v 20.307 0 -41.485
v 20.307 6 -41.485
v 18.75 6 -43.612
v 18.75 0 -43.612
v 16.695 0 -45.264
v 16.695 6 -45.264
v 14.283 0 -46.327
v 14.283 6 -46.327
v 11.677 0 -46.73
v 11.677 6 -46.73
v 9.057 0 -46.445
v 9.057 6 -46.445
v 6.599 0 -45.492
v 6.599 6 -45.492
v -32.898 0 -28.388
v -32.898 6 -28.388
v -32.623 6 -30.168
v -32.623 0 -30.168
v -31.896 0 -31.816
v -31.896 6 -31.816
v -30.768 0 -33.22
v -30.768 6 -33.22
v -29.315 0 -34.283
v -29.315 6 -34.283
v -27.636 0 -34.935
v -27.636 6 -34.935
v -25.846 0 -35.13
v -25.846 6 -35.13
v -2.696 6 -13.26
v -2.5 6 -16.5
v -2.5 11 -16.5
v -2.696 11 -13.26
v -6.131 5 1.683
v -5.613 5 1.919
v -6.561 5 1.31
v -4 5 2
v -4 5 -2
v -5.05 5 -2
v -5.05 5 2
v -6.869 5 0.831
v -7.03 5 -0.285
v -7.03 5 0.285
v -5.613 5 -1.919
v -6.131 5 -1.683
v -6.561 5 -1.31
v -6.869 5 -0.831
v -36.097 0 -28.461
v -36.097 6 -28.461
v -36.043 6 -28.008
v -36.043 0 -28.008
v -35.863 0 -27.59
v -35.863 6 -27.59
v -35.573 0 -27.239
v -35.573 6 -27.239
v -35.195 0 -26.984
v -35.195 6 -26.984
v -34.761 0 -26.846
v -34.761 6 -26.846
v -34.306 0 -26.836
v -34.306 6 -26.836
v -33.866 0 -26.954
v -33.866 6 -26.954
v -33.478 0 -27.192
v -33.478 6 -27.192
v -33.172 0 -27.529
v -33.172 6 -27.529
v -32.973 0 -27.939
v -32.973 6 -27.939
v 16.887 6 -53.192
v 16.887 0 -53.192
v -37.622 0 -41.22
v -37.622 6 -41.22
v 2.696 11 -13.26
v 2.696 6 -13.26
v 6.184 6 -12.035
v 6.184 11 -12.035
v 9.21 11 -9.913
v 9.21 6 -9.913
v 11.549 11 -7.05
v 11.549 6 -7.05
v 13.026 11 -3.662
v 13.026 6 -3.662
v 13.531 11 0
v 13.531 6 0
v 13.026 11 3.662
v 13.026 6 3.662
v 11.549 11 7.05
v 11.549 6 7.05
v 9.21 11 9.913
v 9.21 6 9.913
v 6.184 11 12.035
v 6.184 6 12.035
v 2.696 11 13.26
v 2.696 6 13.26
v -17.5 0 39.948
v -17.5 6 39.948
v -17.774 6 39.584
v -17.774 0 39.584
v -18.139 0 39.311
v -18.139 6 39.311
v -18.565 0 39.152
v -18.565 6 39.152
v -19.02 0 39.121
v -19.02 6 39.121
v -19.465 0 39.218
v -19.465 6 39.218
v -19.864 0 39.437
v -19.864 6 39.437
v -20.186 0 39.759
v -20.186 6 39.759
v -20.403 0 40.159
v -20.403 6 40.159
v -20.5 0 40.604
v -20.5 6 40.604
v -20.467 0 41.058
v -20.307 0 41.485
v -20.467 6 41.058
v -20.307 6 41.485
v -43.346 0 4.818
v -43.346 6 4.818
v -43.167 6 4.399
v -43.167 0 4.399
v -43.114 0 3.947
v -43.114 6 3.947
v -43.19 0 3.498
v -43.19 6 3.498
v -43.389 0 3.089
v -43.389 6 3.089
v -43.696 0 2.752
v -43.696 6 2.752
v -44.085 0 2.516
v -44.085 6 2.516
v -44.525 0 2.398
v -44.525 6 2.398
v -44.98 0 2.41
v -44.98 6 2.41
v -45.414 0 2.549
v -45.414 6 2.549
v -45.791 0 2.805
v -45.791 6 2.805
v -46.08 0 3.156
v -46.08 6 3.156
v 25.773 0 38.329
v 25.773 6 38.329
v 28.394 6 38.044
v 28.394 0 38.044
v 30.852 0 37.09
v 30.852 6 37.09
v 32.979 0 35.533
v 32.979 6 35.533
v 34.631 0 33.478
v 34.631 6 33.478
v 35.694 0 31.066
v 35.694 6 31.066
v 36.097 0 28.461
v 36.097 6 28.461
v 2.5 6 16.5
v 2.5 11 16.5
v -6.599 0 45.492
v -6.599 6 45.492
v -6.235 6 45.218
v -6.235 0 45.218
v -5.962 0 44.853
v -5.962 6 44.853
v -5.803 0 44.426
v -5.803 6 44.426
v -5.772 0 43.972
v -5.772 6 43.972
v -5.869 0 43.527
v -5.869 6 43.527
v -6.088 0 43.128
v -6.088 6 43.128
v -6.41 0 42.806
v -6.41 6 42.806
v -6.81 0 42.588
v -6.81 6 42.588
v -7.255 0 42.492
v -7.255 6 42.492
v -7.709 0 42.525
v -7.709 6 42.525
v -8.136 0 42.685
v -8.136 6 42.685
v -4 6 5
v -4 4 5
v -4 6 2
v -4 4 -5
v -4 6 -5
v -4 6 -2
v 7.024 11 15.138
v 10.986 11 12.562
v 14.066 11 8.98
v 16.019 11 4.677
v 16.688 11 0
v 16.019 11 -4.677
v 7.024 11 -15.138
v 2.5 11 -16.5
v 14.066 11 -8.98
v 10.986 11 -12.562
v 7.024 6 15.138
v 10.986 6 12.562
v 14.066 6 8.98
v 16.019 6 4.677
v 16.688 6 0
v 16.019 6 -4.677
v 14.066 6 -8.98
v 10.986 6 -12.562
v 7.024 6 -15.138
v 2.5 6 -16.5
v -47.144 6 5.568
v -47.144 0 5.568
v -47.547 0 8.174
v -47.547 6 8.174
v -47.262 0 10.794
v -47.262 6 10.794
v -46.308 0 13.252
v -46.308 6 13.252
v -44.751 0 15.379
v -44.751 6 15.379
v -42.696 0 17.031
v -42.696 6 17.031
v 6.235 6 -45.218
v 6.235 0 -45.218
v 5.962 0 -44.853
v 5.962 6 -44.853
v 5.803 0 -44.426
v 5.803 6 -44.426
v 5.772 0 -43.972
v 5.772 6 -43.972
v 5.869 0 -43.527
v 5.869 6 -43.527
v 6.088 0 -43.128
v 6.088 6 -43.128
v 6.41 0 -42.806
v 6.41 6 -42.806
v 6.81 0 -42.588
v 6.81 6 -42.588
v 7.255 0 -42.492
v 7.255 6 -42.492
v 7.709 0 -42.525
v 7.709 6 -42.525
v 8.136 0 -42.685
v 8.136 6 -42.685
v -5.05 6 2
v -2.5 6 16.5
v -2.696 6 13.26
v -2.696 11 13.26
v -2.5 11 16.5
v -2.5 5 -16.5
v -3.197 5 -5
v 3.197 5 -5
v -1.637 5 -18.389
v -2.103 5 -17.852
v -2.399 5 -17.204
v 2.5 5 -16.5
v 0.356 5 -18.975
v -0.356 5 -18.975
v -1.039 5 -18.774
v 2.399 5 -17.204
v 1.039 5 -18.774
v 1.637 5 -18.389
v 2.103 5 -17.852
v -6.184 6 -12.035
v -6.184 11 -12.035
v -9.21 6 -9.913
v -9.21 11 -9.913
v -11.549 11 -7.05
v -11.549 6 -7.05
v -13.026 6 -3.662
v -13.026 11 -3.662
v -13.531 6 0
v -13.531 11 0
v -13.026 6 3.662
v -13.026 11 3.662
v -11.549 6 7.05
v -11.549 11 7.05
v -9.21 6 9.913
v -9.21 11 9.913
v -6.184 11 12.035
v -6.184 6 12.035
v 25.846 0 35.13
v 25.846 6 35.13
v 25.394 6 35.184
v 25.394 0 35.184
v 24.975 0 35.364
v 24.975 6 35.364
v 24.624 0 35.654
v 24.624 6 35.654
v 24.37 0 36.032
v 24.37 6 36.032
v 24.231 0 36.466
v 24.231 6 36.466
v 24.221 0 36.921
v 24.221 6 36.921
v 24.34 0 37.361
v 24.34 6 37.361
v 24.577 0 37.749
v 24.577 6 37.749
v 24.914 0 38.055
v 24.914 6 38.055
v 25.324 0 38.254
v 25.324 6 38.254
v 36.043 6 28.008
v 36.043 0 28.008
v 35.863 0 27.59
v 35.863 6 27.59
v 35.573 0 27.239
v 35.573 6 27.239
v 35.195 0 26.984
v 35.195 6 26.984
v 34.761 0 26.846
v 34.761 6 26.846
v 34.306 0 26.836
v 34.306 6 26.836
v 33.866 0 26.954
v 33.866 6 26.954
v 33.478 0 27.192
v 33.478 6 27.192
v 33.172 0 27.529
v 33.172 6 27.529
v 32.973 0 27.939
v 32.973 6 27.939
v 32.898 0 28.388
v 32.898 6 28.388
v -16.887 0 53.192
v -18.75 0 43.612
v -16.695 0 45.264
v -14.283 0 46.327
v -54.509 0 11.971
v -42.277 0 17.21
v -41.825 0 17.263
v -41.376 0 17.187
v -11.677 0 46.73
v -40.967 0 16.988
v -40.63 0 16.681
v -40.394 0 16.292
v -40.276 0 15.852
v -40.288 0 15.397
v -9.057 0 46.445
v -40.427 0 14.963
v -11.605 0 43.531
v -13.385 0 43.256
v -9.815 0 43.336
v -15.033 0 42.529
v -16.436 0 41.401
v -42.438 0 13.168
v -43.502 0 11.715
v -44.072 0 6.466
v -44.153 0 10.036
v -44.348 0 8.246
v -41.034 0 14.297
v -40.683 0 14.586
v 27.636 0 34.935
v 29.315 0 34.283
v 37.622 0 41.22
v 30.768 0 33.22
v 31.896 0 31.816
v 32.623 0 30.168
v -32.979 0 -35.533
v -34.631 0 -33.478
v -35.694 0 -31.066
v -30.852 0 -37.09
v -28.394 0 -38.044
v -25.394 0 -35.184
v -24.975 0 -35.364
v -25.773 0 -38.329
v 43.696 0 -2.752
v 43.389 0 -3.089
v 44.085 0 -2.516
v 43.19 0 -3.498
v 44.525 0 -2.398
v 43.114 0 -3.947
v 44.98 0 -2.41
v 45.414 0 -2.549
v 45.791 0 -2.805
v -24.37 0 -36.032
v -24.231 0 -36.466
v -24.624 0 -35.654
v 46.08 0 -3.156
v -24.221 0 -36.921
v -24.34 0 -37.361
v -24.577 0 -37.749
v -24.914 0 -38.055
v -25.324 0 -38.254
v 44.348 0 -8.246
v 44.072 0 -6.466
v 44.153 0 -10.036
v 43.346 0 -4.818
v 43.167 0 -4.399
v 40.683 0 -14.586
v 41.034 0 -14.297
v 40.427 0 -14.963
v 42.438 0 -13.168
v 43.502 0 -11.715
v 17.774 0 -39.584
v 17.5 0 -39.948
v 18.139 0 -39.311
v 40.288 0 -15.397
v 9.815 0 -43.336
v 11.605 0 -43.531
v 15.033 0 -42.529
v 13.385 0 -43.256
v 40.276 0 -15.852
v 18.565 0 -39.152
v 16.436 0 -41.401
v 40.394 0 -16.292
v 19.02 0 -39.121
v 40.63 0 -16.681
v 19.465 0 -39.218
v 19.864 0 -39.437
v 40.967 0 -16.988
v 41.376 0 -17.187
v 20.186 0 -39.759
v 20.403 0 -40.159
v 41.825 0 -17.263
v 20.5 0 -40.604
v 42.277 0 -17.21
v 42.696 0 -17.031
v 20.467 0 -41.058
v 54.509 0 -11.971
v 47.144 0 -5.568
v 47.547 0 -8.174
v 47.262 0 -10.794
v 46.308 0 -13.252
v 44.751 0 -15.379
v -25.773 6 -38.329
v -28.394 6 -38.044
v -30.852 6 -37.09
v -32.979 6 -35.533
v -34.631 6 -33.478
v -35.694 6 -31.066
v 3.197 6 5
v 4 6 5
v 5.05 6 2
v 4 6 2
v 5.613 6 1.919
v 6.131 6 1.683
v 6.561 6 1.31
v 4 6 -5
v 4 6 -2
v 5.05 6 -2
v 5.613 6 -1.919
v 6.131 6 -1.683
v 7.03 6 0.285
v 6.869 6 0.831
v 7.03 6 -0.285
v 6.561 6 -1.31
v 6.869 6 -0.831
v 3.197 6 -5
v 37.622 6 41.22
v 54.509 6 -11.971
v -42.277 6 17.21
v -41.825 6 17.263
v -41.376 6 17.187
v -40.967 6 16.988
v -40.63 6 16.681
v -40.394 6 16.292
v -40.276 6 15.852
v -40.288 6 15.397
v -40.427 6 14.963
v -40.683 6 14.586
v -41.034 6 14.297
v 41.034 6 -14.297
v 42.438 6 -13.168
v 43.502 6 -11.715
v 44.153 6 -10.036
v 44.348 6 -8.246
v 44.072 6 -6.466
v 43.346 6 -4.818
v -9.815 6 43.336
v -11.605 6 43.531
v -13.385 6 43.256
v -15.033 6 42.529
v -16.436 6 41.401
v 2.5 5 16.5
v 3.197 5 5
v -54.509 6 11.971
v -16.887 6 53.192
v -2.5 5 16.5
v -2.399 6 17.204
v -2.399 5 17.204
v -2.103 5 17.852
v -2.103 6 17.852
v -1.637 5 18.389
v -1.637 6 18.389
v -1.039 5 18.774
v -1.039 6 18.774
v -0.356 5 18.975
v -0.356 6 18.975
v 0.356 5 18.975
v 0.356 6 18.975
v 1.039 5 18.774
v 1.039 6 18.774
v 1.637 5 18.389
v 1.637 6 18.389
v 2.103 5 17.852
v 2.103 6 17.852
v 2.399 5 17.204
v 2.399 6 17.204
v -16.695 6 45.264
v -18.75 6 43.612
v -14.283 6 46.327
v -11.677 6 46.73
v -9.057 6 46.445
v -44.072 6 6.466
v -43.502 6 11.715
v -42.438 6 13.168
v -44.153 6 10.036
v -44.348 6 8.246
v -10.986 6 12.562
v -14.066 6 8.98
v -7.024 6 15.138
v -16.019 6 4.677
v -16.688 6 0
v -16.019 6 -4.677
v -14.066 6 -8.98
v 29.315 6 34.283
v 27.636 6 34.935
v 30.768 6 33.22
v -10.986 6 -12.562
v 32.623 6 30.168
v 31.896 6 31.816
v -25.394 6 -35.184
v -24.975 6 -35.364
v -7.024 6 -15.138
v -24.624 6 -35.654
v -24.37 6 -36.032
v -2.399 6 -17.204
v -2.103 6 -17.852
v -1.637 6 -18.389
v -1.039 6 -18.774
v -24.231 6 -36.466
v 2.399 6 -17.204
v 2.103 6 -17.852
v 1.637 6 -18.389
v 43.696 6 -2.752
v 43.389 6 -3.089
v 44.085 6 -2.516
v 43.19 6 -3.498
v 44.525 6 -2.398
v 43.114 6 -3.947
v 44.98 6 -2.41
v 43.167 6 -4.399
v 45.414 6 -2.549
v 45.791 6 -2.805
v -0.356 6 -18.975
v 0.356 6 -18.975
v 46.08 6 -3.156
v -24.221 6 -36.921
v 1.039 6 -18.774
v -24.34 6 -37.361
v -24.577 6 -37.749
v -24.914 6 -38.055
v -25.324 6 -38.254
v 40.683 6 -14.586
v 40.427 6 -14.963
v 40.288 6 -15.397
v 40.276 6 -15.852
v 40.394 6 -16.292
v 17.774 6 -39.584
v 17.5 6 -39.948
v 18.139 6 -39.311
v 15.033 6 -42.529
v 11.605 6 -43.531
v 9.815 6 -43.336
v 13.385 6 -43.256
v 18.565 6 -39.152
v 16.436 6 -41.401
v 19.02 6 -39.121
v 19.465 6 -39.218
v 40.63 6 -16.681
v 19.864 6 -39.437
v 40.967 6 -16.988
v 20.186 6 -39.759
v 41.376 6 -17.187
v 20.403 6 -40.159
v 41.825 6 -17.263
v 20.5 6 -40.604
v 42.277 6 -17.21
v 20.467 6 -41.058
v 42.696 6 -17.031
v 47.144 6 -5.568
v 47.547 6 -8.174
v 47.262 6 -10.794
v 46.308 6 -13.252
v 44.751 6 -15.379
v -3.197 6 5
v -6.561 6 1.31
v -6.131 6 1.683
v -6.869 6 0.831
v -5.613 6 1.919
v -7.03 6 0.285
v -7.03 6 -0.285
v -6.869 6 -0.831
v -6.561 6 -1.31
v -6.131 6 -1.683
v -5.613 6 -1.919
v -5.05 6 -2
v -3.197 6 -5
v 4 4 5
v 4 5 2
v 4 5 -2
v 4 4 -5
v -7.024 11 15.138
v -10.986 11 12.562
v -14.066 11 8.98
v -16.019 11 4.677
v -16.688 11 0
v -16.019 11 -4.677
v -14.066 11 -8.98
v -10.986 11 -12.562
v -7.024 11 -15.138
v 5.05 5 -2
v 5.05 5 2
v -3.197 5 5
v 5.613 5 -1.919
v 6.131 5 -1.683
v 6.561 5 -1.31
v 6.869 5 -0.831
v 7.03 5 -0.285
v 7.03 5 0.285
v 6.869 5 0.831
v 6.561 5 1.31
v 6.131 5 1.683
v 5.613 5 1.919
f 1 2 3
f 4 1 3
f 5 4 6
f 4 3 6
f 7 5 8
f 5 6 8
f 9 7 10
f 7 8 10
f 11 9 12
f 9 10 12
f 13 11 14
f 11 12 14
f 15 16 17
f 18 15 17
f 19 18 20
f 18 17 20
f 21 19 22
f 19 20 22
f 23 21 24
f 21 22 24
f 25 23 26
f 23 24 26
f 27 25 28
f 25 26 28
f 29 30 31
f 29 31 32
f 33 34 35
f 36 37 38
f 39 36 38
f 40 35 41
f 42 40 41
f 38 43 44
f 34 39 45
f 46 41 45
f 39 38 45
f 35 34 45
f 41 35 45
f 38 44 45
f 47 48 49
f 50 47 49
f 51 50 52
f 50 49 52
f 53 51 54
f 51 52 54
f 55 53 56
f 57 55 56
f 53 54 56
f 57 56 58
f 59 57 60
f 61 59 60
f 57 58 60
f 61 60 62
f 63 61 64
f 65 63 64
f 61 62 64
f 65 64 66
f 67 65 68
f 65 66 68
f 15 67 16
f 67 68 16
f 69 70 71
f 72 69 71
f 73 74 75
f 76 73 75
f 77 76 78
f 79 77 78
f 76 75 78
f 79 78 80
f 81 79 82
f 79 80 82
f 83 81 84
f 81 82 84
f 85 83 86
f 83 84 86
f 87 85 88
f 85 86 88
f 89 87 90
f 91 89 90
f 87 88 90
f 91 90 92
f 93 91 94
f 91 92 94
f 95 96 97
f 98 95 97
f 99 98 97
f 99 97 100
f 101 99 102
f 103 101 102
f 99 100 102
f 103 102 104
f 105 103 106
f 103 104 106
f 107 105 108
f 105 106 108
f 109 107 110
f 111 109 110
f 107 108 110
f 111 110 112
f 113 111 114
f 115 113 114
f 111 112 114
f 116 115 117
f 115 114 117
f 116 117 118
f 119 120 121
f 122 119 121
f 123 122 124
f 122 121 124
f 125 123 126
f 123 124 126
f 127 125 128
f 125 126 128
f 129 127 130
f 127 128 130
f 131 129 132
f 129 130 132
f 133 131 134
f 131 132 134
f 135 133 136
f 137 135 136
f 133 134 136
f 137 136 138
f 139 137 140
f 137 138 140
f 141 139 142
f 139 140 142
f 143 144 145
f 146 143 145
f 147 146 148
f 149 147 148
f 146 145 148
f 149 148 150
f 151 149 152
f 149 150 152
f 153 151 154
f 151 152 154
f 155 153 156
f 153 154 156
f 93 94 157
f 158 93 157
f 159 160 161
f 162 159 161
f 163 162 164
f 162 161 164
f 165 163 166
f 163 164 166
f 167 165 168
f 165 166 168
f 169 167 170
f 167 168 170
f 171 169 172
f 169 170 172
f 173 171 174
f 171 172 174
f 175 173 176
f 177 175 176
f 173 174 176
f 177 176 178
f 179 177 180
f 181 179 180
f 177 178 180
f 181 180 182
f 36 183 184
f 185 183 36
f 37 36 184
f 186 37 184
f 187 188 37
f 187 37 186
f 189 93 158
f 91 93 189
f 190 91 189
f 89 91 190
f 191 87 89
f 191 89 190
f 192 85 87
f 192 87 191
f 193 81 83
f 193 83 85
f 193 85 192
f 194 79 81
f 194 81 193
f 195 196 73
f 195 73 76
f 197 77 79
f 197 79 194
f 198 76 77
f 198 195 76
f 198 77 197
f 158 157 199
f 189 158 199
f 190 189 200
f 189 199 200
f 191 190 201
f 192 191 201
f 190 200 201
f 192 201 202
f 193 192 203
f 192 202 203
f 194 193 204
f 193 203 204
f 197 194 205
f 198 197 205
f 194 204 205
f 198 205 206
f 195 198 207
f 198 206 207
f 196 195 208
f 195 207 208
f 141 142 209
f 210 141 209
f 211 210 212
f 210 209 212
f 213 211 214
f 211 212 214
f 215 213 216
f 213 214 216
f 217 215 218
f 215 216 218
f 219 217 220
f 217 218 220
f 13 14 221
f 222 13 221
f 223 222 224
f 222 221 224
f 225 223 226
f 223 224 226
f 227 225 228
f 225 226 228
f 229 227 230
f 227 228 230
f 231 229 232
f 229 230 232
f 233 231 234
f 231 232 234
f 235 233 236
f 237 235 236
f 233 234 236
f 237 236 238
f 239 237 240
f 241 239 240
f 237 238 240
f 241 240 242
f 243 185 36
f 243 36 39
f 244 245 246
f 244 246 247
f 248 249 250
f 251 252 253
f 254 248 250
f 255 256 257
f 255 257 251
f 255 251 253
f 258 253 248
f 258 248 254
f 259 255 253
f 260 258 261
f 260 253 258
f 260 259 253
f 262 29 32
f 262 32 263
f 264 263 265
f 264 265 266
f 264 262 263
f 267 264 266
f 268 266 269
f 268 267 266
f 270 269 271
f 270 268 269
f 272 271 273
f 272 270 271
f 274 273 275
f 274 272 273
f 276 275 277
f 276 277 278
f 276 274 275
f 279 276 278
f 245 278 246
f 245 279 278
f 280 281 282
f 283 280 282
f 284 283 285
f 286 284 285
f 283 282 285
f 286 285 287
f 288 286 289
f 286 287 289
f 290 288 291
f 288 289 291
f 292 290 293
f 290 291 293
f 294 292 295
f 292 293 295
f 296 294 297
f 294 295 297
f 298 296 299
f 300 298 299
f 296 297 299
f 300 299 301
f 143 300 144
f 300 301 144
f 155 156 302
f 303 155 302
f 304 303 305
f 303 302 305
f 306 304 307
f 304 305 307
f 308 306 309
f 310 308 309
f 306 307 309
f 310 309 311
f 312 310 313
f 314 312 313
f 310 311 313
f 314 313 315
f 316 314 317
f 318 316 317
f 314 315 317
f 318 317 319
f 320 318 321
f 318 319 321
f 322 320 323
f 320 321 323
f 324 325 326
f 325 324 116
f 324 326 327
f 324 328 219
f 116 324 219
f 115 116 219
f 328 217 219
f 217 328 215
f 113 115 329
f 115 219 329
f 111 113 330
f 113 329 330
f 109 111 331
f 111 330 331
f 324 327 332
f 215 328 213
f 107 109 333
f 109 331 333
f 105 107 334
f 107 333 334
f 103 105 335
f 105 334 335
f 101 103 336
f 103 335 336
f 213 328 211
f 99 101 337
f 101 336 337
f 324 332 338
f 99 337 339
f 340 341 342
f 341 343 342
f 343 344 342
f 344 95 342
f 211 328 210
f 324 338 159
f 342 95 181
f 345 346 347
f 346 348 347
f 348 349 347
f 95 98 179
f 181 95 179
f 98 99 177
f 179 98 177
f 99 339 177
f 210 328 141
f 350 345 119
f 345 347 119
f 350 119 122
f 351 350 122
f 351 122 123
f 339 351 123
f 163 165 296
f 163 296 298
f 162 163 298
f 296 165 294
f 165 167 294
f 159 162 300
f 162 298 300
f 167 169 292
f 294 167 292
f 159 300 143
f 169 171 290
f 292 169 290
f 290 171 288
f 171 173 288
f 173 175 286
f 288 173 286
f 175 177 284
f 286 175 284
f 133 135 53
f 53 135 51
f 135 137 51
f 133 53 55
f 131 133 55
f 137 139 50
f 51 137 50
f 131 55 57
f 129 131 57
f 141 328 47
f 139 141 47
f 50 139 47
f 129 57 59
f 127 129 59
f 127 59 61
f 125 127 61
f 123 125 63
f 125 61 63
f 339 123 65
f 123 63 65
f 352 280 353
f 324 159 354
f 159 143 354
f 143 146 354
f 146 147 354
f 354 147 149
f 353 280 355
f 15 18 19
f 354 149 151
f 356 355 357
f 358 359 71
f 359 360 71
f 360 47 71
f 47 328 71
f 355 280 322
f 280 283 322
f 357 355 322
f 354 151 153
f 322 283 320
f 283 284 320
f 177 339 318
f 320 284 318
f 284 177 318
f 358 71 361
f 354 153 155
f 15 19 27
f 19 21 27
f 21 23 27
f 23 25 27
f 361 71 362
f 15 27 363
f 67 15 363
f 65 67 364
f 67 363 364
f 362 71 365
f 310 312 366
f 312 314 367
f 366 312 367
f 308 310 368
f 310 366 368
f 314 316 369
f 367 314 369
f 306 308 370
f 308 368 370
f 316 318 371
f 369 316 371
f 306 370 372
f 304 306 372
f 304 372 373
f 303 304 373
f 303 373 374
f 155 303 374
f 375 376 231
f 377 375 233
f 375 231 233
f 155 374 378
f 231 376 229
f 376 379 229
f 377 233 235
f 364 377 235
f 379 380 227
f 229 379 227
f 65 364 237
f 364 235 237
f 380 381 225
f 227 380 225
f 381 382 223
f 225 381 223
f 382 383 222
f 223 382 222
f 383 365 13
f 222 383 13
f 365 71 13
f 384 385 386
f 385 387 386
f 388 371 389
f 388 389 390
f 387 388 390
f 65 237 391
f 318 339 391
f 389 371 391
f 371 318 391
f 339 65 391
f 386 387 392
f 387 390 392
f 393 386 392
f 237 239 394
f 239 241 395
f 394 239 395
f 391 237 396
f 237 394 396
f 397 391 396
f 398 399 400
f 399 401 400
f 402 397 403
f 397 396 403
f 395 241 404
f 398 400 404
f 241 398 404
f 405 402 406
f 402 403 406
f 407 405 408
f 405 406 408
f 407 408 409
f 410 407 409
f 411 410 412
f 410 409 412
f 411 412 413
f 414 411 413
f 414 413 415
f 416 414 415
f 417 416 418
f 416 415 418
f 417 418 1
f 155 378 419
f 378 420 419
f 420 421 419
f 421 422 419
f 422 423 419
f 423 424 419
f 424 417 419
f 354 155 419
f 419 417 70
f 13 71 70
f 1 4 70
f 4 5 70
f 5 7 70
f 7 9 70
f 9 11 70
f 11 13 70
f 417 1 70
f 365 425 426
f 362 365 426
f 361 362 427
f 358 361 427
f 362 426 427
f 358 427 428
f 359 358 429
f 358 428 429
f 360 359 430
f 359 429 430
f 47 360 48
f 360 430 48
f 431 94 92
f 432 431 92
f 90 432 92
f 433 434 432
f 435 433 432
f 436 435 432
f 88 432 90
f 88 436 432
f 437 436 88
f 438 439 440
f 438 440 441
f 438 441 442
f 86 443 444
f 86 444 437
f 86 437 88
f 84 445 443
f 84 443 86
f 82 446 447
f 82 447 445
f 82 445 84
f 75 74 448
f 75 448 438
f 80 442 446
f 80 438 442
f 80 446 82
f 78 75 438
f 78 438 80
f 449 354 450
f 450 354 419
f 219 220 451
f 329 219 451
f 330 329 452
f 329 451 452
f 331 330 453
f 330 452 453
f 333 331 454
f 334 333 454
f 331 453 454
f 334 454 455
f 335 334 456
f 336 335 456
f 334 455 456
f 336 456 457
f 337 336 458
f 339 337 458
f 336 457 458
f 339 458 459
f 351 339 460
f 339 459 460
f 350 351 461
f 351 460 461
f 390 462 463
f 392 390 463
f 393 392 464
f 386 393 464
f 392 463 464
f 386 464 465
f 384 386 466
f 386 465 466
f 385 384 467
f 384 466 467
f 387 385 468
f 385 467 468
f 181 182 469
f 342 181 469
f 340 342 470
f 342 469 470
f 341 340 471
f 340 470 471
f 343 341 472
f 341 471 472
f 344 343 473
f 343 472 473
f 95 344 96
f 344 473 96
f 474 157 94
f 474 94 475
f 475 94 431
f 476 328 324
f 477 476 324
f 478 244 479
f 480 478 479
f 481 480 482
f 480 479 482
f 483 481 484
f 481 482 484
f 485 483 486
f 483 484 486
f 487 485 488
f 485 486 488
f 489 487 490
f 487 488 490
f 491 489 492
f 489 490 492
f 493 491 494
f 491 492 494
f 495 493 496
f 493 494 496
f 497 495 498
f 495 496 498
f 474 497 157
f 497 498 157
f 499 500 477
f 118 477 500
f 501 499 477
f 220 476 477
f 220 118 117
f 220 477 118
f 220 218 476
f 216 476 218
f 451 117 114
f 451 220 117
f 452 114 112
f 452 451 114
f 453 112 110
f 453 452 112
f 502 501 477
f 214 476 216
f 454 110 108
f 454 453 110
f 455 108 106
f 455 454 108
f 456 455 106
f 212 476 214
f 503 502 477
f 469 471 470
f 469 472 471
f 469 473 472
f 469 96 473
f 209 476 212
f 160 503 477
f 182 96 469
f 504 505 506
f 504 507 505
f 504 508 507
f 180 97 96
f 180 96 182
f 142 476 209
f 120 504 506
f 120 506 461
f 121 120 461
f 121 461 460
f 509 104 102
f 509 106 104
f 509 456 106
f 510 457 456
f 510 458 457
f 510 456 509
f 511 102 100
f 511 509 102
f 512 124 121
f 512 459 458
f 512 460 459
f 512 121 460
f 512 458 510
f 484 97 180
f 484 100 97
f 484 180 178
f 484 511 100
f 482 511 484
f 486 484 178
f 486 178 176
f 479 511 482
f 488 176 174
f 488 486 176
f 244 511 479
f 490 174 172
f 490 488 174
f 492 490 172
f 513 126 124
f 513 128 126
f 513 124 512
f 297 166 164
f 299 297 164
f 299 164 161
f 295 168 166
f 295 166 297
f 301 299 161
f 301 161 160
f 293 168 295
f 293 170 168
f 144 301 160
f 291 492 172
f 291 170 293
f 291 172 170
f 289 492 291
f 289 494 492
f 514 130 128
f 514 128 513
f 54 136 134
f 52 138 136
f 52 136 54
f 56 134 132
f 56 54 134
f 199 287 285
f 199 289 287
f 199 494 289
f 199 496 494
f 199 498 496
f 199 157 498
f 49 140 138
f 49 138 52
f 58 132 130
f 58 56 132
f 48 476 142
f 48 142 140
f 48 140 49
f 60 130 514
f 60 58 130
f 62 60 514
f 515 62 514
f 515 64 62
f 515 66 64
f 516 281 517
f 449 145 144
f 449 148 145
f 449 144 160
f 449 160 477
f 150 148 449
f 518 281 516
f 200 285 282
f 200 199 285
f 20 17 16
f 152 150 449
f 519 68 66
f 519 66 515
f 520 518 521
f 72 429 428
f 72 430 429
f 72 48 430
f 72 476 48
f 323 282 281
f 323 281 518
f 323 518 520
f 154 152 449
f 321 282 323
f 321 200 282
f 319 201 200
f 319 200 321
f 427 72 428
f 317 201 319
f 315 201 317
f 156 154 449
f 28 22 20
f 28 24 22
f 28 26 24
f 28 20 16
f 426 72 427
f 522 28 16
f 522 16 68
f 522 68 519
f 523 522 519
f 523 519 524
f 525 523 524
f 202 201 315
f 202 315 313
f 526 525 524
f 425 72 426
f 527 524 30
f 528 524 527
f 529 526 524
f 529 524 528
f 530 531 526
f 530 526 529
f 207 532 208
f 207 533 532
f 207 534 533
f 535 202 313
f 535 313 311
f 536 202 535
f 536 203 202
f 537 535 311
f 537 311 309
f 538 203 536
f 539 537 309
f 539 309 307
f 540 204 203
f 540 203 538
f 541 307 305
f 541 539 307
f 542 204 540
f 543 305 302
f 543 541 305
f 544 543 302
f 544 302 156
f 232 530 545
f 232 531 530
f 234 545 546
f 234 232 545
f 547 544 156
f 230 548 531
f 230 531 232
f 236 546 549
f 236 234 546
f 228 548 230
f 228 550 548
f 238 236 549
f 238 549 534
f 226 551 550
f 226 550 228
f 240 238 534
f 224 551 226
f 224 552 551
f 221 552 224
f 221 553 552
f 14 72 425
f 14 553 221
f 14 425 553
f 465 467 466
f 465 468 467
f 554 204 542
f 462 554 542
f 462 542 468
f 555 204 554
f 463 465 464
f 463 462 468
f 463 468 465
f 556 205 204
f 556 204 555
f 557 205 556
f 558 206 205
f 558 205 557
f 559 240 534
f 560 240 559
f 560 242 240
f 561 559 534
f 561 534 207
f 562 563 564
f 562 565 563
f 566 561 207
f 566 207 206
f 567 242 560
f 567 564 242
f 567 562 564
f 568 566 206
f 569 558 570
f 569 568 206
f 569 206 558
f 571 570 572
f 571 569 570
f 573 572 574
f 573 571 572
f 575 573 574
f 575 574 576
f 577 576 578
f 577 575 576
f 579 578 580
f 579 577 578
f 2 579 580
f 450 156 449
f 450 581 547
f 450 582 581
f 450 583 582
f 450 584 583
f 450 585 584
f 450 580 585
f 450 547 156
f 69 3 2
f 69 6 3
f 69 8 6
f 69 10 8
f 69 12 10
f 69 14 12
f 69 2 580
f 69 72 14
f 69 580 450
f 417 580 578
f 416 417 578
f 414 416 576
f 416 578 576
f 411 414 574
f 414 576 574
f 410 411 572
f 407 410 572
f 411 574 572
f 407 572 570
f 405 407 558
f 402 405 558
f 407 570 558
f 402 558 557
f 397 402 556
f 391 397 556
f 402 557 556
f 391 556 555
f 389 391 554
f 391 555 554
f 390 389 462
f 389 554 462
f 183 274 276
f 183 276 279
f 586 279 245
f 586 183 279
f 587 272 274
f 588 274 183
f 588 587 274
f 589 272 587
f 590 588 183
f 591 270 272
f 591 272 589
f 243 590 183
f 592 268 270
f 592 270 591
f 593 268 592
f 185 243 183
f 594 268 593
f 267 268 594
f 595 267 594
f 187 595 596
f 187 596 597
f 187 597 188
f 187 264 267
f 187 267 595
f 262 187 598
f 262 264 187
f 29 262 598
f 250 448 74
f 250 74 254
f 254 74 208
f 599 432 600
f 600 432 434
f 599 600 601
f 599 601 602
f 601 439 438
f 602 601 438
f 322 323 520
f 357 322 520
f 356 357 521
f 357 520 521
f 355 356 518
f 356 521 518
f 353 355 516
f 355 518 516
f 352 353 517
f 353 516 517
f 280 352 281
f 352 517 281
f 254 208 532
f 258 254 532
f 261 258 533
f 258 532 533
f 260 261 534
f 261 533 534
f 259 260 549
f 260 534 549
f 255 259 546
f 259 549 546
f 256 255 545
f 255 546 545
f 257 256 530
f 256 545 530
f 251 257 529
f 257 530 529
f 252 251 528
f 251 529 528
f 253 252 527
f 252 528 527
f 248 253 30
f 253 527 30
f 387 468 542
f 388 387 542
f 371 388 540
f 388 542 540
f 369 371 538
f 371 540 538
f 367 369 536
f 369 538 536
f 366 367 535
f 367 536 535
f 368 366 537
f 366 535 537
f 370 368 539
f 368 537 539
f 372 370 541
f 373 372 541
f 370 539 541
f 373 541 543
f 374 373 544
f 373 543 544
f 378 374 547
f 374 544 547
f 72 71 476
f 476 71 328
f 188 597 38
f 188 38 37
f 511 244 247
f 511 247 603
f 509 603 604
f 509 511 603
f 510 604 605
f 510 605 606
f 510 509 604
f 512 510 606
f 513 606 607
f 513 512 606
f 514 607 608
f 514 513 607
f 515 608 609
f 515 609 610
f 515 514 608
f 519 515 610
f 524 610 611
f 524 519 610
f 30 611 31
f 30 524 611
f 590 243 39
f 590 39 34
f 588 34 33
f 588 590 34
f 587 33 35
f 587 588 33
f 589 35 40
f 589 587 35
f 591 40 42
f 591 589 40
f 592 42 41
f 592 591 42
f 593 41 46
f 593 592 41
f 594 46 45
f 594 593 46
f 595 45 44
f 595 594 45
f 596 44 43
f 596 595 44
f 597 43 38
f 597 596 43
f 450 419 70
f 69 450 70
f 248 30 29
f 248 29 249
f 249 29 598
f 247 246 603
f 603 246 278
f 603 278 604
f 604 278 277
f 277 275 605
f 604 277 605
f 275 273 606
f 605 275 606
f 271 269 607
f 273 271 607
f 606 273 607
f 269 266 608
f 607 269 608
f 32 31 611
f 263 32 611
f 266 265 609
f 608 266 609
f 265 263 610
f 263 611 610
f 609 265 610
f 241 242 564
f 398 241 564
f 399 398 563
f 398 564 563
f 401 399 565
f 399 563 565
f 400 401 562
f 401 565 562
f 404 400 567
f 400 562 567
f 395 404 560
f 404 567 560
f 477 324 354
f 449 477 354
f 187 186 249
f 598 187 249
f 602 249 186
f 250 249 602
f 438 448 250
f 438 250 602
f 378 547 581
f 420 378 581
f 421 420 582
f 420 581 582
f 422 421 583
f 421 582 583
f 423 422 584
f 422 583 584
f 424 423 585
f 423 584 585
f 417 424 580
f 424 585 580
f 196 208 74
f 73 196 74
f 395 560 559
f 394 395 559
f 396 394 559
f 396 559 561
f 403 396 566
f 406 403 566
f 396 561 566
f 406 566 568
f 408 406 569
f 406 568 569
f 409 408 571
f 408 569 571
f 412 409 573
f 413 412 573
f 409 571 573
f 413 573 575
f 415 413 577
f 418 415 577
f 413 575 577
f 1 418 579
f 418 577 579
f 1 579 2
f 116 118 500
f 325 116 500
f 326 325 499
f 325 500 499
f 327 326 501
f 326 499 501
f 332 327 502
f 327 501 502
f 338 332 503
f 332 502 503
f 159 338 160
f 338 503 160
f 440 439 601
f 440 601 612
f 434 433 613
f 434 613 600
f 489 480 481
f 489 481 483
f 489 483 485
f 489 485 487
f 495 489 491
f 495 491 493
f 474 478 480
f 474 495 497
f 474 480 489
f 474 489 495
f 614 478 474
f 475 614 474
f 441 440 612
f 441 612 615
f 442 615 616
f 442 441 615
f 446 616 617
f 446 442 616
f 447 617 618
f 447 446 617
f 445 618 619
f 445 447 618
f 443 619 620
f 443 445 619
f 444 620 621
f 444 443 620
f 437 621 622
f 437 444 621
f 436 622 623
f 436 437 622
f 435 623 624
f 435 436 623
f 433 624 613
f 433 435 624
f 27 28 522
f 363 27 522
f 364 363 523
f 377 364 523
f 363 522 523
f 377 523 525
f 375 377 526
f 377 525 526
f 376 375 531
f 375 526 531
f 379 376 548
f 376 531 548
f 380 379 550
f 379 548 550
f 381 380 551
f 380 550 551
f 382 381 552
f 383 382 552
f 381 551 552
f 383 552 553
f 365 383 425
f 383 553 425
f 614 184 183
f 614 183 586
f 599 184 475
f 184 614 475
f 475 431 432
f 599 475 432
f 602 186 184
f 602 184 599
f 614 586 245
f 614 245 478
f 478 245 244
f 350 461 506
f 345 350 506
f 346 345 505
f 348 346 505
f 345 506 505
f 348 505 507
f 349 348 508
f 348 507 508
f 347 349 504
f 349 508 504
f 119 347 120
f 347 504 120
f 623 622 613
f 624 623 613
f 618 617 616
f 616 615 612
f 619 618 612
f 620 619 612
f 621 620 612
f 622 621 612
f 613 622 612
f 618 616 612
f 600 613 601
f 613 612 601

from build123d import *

# Parameters (mm, degrees)
BOSS_EXTRU_1_DEPTH      = 6
ESQUISSE2_W             = 8
ESQUISSE2_H             = 10
ENL_V_MAT_EXTRU_1_DEPTH = 2
ENL_V_MAT_EXTRU_2_DEPTH = 1
ENL_V_MAT_EXTRU_3_DEPTH = 1
BOSS_EXTRU_2_DEPTH      = 5
ENL_V_MAT_EXTRU_4_DEPTH = 6


with BuildPart() as part:
    # Esquisse1 → Boss.-Extru.1 (new body)
    with BuildSketch(Plane(origin=(0, 0, 0), x_dir=(1, 0, 0), z_dir=(0, 1, 0))):
        Polygon((-37.62183883, 41.220449501), (-54.508875838, -11.971243414), (-16.887037008, -53.191692914), (37.62183883, -41.220449501), (54.508875838, 11.971243414), (16.887037008, 53.191692914), align=None)
    extrude(amount=BOSS_EXTRU_1_DEPTH)

    # Esquisse2 → Enlèv. mat.-Extru.1 (cut)
    with BuildSketch(Plane(origin=(0, 6, 0), x_dir=(1, 0, 0), z_dir=(0, 1, 0))):
        Rectangle(ESQUISSE2_W, ESQUISSE2_H)
    extrude(amount=-ENL_V_MAT_EXTRU_1_DEPTH, mode=Mode.SUBTRACT)

    # Esquisse5 → Enlèv. mat.-Extru.2 (cut)
    with BuildSketch(Plane(origin=(0, 6, 0), x_dir=(1, 0, 0), z_dir=(0, 1, 0))):
        with BuildLine():
            Line((-2.5, 16.5), (-3.5, 0))
            Line((-3.5, 0), (-2.5, -16.5))
            ThreePointArc((-2.5, -16.5), (0, -19), (2.5, -16.5))
            Line((2.5, -16.5), (3.5, 0))
            Line((3.5, 0), (2.5, 16.5))
            ThreePointArc((2.5, 16.5), (0, 19), (-2.5, 16.5))
        make_face()
    extrude(amount=-ENL_V_MAT_EXTRU_2_DEPTH, mode=Mode.SUBTRACT)

    # Esquisse6 → Enlèv. mat.-Extru.3 (cut)
    with BuildSketch(Plane(origin=(0, 6, 0), x_dir=(1, 0, 0), z_dir=(0, 1, 0))):
        with BuildLine():
            Line((-5.05, 2), (5.05, 2))
            ThreePointArc((5.05, 2), (7.05, 0), (5.05, -2))
            Line((5.05, -2), (-5.05, -2))
            ThreePointArc((-5.05, -2), (-7.05, 0), (-5.05, 2))
        make_face()
    extrude(amount=-ENL_V_MAT_EXTRU_3_DEPTH, mode=Mode.SUBTRACT)

    # Esquisse7 → Boss.-Extru.2 (add)
    with BuildSketch(Plane(origin=(0, 6, 0), x_dir=(1, 0, 0), z_dir=(0, 1, 0))):
        with BuildLine():
            Line((-2.5, 16.5), (-2.696377272, 13.259775018))
            ThreePointArc((-2.696377272, 13.259775018), (-13.53115235, 0), (-2.696377272, -13.259775018))
            Line((-2.696377272, -13.259775018), (-2.5, -16.5))
            ThreePointArc((-2.5, -16.5), (-16.688319268, 0), (-2.5, 16.5))
        make_face()
        with BuildLine():
            Line((2.5, 16.5), (2.696377272, 13.259775018))
            ThreePointArc((2.696377272, 13.259775018), (13.53115235, 0), (2.696377272, -13.259775018))
            Line((2.696377272, -13.259775018), (2.5, -16.5))
            ThreePointArc((2.5, -16.5), (16.688319268, 0), (2.5, 16.5))
        make_face()
    extrude(amount=BOSS_EXTRU_2_DEPTH)

    # Esquisse8 → Enlèv. mat.-Extru.4 (cut)
    with BuildSketch(Plane(origin=(0, 6, 0), x_dir=(1, 0, 0), z_dir=(0, 1, 0))):
        with BuildLine():
            ThreePointArc((-46.080402753, -3.15609697), (-47.261935037, -10.79446929), (-42.696259662, -17.031083645))
            ThreePointArc((-42.696259662, -17.031083645), (-40.497960079, -16.494913015), (-41.034130709, -14.296613432))
            ThreePointArc((-41.034130709, -14.296613432), (-44.153069953, -10.036209514), (-43.345932541, -4.818225923))
            ThreePointArc((-43.345932541, -4.818225923), (-43.882103171, -2.61992634), (-46.080402753, -3.15609697))
        make_face()
        with BuildLine():
            ThreePointArc((-25.773461529, 38.328750916), (-32.979252144, 35.532801729), (-36.097480922, 28.460503691))
            ThreePointArc((-36.097480922, 28.460503691), (-34.533993744, 26.824805722), (-32.898295775, 28.3882929))
            ThreePointArc((-32.898295775, 28.3882929), (-30.768147373, 33.219575477), (-25.845672321, 35.12956577))
            ThreePointArc((-25.845672321, 35.12956577), (-24.209974352, 36.693052947), (-25.773461529, 38.328750916))
        make_face()
        with BuildLine():
            ThreePointArc((20.306941224, 41.484847886), (14.282682893, 46.327271019), (6.59877874, 45.491587336))
            ThreePointArc((6.59877874, 45.491587336), (5.963966335, 43.319718738), (8.135834934, 42.684906333))
            ThreePointArc((8.135834934, 42.684906333), (13.38492258, 43.255784991), (17.50026022, 39.947791692))
            ThreePointArc((17.50026022, 39.947791692), (19.672128819, 39.312979287), (20.306941224, 41.484847886))
        make_face()
        with BuildLine():
            ThreePointArc((46.080402753, 3.15609697), (47.261935037, 10.79446929), (42.696259662, 17.031083645))
            ThreePointArc((42.696259662, 17.031083645), (40.497960079, 16.494913015), (41.034130709, 14.296613432))
            ThreePointArc((41.034130709, 14.296613432), (44.153069953, 10.036209514), (43.345932541, 4.818225923))
            ThreePointArc((43.345932541, 4.818225923), (43.882103171, 2.61992634), (46.080402753, 3.15609697))
        make_face()
        with BuildLine():
            ThreePointArc((25.773461529, -38.328750916), (32.979252144, -35.532801729), (36.097480922, -28.460503691))
            ThreePointArc((36.097480922, -28.460503691), (34.533993744, -26.824805722), (32.898295775, -28.3882929))
            ThreePointArc((32.898295775, -28.3882929), (30.768147373, -33.219575477), (25.845672321, -35.12956577))
            ThreePointArc((25.845672321, -35.12956577), (24.209974352, -36.693052947), (25.773461529, -38.328750916))
        make_face()
        with BuildLine():
            ThreePointArc((-20.306941224, -41.484847886), (-14.282682893, -46.327271019), (-6.59877874, -45.491587336))
            ThreePointArc((-6.59877874, -45.491587336), (-5.963966335, -43.319718738), (-8.135834934, -42.684906333))
            ThreePointArc((-8.135834934, -42.684906333), (-13.38492258, -43.255784991), (-17.50026022, -39.947791692))
            ThreePointArc((-17.50026022, -39.947791692), (-19.672128819, -39.312979287), (-20.306941224, -41.484847886))
        make_face()
    extrude(amount=-ENL_V_MAT_EXTRU_4_DEPTH, mode=Mode.SUBTRACT)


solid = part.part
